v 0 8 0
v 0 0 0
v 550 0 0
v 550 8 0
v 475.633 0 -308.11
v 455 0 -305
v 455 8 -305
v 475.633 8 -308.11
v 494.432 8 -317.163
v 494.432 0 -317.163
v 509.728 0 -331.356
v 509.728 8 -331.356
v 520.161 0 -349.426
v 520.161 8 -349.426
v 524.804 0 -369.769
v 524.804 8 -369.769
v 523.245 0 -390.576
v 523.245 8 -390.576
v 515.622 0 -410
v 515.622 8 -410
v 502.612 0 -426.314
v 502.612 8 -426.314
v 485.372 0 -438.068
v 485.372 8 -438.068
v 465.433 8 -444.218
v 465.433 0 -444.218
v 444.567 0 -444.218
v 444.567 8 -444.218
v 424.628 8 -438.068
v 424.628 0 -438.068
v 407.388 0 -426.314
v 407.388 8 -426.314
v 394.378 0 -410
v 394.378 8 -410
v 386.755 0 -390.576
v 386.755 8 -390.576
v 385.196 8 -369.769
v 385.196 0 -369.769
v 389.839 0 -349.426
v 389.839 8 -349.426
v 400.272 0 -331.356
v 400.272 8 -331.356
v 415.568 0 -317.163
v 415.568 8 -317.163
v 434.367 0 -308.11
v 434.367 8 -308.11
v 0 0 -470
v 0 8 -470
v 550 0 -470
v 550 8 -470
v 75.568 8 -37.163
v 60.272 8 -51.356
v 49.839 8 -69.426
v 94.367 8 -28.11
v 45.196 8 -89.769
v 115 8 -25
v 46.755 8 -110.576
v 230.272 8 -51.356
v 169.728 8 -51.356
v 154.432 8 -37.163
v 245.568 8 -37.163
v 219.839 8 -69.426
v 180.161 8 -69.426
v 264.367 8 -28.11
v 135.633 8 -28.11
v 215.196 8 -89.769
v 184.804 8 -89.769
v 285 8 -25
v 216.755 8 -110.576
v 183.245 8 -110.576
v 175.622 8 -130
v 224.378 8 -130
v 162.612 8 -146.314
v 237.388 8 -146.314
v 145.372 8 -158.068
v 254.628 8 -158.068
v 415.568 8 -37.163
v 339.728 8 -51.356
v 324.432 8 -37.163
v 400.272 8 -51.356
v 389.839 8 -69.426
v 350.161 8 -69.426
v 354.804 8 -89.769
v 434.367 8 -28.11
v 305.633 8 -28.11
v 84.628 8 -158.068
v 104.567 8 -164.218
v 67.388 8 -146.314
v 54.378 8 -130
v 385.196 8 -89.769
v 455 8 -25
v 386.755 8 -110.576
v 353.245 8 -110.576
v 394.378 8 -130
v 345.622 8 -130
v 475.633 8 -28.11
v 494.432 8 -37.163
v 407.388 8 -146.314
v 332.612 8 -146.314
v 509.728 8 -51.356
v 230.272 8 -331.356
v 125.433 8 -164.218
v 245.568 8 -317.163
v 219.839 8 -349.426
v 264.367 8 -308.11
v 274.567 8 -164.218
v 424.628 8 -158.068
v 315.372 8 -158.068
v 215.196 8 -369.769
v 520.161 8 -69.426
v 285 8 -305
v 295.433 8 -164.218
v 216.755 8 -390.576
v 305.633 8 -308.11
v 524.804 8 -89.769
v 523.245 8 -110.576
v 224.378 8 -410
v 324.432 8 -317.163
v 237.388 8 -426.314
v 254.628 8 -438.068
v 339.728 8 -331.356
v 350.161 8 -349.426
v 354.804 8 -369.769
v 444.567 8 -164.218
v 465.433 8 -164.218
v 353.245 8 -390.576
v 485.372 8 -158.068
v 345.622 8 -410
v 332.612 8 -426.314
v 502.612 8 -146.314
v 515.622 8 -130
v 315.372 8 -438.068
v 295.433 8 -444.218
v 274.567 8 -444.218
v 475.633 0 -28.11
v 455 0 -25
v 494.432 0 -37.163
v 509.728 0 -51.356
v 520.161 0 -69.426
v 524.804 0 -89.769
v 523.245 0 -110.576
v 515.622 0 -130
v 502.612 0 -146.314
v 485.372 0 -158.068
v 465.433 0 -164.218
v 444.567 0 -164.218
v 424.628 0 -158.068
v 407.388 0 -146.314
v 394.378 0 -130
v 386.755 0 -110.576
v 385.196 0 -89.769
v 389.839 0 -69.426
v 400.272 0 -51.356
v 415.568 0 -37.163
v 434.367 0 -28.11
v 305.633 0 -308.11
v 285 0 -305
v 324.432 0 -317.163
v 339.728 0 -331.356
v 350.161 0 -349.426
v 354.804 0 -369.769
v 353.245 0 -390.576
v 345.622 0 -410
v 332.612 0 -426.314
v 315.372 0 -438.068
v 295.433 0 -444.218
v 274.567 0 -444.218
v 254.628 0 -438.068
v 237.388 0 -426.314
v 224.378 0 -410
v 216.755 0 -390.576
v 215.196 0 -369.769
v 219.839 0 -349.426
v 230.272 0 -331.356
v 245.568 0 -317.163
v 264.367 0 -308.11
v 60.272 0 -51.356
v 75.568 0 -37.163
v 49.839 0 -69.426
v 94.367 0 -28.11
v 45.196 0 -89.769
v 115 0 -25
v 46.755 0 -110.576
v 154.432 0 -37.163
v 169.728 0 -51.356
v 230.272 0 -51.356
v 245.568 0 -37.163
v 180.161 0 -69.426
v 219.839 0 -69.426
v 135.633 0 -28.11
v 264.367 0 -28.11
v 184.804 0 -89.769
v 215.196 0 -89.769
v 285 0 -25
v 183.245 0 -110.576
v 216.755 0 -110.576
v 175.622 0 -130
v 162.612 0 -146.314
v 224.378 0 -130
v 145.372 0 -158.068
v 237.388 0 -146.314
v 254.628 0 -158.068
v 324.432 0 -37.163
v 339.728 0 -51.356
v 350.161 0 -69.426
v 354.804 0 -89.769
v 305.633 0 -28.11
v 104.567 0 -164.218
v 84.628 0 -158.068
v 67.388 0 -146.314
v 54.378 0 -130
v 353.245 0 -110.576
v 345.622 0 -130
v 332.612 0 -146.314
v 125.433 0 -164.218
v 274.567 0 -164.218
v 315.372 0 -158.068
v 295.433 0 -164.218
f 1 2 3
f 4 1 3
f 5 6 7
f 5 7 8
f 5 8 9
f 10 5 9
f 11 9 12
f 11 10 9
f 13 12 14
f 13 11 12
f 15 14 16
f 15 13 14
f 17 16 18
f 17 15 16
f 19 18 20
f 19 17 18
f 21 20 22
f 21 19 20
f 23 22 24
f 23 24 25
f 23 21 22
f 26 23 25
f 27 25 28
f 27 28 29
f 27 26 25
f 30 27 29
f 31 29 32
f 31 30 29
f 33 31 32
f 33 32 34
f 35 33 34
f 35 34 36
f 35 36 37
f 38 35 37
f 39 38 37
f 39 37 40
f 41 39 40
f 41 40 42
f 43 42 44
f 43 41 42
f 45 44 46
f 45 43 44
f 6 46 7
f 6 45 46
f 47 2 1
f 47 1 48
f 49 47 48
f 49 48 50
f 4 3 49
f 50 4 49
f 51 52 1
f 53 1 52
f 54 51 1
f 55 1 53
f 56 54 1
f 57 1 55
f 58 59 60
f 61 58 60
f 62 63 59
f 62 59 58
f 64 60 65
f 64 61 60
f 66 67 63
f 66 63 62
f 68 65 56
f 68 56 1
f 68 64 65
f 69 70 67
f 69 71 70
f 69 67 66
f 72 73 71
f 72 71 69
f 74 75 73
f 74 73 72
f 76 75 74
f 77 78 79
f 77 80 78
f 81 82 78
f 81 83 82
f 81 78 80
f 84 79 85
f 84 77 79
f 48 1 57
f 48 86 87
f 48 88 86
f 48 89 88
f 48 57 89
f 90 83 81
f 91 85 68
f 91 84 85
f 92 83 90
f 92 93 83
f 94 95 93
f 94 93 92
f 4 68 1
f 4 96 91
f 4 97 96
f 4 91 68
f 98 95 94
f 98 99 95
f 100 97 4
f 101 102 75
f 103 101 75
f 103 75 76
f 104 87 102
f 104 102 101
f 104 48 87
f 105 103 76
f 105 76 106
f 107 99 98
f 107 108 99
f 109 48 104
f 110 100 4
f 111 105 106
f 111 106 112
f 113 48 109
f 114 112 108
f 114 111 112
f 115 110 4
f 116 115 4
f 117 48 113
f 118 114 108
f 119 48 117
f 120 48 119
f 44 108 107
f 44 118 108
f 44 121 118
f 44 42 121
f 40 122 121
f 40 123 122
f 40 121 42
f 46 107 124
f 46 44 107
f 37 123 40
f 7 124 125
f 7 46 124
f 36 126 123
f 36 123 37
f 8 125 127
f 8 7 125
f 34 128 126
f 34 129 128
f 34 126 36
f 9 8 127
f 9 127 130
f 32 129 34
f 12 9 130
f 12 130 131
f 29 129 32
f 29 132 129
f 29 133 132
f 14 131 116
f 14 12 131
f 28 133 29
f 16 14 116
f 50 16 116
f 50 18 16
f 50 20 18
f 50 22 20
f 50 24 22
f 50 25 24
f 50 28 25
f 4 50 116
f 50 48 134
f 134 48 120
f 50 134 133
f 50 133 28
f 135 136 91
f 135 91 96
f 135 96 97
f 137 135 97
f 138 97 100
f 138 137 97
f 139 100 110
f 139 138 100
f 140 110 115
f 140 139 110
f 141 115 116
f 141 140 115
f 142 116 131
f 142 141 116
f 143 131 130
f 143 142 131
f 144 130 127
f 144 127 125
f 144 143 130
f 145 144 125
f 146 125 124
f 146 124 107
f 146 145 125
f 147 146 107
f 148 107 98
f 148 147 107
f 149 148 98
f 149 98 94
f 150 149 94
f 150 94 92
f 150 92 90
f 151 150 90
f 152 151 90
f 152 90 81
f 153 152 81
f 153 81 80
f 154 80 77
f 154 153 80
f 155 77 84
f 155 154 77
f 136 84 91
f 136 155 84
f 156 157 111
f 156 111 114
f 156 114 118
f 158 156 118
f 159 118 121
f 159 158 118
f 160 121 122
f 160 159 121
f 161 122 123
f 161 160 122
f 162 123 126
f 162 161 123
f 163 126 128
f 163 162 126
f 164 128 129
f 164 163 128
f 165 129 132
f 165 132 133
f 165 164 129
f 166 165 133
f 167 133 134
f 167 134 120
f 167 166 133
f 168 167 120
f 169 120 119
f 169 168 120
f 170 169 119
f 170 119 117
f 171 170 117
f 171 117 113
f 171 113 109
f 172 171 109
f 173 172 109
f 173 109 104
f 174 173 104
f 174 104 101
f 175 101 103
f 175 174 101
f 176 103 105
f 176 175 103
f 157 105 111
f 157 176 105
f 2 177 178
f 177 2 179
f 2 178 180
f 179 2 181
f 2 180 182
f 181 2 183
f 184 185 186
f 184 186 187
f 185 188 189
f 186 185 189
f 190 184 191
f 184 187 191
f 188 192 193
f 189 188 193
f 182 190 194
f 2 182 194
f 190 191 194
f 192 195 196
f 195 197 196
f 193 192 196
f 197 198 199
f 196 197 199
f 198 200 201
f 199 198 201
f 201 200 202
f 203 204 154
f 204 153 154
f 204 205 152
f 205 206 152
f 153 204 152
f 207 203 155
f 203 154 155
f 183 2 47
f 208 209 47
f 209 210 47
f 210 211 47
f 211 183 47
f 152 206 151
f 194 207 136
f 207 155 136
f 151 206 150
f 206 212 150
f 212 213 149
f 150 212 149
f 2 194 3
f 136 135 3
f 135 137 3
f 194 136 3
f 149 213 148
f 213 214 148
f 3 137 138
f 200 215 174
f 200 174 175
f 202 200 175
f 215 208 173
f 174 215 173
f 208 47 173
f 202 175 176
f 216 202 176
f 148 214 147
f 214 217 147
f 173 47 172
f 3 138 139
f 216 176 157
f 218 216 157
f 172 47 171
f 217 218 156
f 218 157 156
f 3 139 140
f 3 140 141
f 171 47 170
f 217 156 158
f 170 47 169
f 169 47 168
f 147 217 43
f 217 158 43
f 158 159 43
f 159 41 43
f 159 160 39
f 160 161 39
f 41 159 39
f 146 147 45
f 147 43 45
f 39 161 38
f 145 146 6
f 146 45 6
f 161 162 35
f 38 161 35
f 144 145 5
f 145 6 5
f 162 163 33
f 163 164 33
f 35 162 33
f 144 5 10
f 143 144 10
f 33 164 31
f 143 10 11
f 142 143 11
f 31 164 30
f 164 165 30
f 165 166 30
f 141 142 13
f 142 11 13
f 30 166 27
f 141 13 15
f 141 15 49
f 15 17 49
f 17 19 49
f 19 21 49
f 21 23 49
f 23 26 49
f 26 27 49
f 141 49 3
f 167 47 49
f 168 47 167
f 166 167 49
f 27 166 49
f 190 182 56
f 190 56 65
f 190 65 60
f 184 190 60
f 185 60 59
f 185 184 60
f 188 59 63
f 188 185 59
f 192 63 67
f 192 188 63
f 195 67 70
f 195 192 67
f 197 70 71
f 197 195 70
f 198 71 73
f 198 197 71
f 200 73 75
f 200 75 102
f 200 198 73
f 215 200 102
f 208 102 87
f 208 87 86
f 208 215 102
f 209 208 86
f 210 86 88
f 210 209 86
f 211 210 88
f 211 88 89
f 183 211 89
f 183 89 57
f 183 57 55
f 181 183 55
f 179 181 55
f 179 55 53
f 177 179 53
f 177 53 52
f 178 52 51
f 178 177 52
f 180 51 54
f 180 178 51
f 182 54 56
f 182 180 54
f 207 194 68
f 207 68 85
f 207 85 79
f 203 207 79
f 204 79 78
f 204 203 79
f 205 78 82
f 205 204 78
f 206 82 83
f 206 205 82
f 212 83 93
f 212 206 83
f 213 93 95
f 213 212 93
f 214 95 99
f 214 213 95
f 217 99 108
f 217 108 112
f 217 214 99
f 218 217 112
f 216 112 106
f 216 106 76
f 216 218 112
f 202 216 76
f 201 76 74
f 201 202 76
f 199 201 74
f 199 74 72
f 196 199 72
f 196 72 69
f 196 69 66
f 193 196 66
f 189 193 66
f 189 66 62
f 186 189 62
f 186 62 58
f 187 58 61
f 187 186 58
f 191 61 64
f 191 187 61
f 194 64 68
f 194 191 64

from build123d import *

# Parameters (mm, degrees)
SKETCH1_W           = 550
SKETCH1_H           = 470
BOSS_EXTRUDE1_DEPTH = 8
SKETCH2_R           = 70
CUT_EXTRUDE5_DEPTH  = 8


with BuildPart() as part:
    # Sketch1 → Boss-Extrude1 (new body)
    with BuildSketch(Plane(origin=(0, 0, 0), x_dir=(1, 0, 0), z_dir=(0, 1, 0))):
        with Locations((275, 235)):
            Rectangle(SKETCH1_W, SKETCH1_H)
    extrude(amount=BOSS_EXTRUDE1_DEPTH)

    # Sketch2 → Cut-Extrude5 (cut)
    with BuildSketch(Plane(origin=(0, 0, 0), x_dir=(1, 0, 0), z_dir=(0, 1, 0))):
        with Locations(Location((455, 95, 0), (0, 0, 270))):
            Circle(SKETCH2_R)
        with Locations(Location((285, 95, 0), (0, 0, 270))):
            Circle(SKETCH2_R)
        with Locations(Location((115, 95, 0), (0, 0, 270))):
            Circle(SKETCH2_R)
        with Locations(Location((455, 375, 0), (0, 0, 270))):
            Circle(SKETCH2_R)
        with Locations(Location((285, 375, 0), (0, 0, 270))):
            Circle(SKETCH2_R)
    extrude(amount=CUT_EXTRUDE5_DEPTH, mode=Mode.SUBTRACT)


solid = part.part
